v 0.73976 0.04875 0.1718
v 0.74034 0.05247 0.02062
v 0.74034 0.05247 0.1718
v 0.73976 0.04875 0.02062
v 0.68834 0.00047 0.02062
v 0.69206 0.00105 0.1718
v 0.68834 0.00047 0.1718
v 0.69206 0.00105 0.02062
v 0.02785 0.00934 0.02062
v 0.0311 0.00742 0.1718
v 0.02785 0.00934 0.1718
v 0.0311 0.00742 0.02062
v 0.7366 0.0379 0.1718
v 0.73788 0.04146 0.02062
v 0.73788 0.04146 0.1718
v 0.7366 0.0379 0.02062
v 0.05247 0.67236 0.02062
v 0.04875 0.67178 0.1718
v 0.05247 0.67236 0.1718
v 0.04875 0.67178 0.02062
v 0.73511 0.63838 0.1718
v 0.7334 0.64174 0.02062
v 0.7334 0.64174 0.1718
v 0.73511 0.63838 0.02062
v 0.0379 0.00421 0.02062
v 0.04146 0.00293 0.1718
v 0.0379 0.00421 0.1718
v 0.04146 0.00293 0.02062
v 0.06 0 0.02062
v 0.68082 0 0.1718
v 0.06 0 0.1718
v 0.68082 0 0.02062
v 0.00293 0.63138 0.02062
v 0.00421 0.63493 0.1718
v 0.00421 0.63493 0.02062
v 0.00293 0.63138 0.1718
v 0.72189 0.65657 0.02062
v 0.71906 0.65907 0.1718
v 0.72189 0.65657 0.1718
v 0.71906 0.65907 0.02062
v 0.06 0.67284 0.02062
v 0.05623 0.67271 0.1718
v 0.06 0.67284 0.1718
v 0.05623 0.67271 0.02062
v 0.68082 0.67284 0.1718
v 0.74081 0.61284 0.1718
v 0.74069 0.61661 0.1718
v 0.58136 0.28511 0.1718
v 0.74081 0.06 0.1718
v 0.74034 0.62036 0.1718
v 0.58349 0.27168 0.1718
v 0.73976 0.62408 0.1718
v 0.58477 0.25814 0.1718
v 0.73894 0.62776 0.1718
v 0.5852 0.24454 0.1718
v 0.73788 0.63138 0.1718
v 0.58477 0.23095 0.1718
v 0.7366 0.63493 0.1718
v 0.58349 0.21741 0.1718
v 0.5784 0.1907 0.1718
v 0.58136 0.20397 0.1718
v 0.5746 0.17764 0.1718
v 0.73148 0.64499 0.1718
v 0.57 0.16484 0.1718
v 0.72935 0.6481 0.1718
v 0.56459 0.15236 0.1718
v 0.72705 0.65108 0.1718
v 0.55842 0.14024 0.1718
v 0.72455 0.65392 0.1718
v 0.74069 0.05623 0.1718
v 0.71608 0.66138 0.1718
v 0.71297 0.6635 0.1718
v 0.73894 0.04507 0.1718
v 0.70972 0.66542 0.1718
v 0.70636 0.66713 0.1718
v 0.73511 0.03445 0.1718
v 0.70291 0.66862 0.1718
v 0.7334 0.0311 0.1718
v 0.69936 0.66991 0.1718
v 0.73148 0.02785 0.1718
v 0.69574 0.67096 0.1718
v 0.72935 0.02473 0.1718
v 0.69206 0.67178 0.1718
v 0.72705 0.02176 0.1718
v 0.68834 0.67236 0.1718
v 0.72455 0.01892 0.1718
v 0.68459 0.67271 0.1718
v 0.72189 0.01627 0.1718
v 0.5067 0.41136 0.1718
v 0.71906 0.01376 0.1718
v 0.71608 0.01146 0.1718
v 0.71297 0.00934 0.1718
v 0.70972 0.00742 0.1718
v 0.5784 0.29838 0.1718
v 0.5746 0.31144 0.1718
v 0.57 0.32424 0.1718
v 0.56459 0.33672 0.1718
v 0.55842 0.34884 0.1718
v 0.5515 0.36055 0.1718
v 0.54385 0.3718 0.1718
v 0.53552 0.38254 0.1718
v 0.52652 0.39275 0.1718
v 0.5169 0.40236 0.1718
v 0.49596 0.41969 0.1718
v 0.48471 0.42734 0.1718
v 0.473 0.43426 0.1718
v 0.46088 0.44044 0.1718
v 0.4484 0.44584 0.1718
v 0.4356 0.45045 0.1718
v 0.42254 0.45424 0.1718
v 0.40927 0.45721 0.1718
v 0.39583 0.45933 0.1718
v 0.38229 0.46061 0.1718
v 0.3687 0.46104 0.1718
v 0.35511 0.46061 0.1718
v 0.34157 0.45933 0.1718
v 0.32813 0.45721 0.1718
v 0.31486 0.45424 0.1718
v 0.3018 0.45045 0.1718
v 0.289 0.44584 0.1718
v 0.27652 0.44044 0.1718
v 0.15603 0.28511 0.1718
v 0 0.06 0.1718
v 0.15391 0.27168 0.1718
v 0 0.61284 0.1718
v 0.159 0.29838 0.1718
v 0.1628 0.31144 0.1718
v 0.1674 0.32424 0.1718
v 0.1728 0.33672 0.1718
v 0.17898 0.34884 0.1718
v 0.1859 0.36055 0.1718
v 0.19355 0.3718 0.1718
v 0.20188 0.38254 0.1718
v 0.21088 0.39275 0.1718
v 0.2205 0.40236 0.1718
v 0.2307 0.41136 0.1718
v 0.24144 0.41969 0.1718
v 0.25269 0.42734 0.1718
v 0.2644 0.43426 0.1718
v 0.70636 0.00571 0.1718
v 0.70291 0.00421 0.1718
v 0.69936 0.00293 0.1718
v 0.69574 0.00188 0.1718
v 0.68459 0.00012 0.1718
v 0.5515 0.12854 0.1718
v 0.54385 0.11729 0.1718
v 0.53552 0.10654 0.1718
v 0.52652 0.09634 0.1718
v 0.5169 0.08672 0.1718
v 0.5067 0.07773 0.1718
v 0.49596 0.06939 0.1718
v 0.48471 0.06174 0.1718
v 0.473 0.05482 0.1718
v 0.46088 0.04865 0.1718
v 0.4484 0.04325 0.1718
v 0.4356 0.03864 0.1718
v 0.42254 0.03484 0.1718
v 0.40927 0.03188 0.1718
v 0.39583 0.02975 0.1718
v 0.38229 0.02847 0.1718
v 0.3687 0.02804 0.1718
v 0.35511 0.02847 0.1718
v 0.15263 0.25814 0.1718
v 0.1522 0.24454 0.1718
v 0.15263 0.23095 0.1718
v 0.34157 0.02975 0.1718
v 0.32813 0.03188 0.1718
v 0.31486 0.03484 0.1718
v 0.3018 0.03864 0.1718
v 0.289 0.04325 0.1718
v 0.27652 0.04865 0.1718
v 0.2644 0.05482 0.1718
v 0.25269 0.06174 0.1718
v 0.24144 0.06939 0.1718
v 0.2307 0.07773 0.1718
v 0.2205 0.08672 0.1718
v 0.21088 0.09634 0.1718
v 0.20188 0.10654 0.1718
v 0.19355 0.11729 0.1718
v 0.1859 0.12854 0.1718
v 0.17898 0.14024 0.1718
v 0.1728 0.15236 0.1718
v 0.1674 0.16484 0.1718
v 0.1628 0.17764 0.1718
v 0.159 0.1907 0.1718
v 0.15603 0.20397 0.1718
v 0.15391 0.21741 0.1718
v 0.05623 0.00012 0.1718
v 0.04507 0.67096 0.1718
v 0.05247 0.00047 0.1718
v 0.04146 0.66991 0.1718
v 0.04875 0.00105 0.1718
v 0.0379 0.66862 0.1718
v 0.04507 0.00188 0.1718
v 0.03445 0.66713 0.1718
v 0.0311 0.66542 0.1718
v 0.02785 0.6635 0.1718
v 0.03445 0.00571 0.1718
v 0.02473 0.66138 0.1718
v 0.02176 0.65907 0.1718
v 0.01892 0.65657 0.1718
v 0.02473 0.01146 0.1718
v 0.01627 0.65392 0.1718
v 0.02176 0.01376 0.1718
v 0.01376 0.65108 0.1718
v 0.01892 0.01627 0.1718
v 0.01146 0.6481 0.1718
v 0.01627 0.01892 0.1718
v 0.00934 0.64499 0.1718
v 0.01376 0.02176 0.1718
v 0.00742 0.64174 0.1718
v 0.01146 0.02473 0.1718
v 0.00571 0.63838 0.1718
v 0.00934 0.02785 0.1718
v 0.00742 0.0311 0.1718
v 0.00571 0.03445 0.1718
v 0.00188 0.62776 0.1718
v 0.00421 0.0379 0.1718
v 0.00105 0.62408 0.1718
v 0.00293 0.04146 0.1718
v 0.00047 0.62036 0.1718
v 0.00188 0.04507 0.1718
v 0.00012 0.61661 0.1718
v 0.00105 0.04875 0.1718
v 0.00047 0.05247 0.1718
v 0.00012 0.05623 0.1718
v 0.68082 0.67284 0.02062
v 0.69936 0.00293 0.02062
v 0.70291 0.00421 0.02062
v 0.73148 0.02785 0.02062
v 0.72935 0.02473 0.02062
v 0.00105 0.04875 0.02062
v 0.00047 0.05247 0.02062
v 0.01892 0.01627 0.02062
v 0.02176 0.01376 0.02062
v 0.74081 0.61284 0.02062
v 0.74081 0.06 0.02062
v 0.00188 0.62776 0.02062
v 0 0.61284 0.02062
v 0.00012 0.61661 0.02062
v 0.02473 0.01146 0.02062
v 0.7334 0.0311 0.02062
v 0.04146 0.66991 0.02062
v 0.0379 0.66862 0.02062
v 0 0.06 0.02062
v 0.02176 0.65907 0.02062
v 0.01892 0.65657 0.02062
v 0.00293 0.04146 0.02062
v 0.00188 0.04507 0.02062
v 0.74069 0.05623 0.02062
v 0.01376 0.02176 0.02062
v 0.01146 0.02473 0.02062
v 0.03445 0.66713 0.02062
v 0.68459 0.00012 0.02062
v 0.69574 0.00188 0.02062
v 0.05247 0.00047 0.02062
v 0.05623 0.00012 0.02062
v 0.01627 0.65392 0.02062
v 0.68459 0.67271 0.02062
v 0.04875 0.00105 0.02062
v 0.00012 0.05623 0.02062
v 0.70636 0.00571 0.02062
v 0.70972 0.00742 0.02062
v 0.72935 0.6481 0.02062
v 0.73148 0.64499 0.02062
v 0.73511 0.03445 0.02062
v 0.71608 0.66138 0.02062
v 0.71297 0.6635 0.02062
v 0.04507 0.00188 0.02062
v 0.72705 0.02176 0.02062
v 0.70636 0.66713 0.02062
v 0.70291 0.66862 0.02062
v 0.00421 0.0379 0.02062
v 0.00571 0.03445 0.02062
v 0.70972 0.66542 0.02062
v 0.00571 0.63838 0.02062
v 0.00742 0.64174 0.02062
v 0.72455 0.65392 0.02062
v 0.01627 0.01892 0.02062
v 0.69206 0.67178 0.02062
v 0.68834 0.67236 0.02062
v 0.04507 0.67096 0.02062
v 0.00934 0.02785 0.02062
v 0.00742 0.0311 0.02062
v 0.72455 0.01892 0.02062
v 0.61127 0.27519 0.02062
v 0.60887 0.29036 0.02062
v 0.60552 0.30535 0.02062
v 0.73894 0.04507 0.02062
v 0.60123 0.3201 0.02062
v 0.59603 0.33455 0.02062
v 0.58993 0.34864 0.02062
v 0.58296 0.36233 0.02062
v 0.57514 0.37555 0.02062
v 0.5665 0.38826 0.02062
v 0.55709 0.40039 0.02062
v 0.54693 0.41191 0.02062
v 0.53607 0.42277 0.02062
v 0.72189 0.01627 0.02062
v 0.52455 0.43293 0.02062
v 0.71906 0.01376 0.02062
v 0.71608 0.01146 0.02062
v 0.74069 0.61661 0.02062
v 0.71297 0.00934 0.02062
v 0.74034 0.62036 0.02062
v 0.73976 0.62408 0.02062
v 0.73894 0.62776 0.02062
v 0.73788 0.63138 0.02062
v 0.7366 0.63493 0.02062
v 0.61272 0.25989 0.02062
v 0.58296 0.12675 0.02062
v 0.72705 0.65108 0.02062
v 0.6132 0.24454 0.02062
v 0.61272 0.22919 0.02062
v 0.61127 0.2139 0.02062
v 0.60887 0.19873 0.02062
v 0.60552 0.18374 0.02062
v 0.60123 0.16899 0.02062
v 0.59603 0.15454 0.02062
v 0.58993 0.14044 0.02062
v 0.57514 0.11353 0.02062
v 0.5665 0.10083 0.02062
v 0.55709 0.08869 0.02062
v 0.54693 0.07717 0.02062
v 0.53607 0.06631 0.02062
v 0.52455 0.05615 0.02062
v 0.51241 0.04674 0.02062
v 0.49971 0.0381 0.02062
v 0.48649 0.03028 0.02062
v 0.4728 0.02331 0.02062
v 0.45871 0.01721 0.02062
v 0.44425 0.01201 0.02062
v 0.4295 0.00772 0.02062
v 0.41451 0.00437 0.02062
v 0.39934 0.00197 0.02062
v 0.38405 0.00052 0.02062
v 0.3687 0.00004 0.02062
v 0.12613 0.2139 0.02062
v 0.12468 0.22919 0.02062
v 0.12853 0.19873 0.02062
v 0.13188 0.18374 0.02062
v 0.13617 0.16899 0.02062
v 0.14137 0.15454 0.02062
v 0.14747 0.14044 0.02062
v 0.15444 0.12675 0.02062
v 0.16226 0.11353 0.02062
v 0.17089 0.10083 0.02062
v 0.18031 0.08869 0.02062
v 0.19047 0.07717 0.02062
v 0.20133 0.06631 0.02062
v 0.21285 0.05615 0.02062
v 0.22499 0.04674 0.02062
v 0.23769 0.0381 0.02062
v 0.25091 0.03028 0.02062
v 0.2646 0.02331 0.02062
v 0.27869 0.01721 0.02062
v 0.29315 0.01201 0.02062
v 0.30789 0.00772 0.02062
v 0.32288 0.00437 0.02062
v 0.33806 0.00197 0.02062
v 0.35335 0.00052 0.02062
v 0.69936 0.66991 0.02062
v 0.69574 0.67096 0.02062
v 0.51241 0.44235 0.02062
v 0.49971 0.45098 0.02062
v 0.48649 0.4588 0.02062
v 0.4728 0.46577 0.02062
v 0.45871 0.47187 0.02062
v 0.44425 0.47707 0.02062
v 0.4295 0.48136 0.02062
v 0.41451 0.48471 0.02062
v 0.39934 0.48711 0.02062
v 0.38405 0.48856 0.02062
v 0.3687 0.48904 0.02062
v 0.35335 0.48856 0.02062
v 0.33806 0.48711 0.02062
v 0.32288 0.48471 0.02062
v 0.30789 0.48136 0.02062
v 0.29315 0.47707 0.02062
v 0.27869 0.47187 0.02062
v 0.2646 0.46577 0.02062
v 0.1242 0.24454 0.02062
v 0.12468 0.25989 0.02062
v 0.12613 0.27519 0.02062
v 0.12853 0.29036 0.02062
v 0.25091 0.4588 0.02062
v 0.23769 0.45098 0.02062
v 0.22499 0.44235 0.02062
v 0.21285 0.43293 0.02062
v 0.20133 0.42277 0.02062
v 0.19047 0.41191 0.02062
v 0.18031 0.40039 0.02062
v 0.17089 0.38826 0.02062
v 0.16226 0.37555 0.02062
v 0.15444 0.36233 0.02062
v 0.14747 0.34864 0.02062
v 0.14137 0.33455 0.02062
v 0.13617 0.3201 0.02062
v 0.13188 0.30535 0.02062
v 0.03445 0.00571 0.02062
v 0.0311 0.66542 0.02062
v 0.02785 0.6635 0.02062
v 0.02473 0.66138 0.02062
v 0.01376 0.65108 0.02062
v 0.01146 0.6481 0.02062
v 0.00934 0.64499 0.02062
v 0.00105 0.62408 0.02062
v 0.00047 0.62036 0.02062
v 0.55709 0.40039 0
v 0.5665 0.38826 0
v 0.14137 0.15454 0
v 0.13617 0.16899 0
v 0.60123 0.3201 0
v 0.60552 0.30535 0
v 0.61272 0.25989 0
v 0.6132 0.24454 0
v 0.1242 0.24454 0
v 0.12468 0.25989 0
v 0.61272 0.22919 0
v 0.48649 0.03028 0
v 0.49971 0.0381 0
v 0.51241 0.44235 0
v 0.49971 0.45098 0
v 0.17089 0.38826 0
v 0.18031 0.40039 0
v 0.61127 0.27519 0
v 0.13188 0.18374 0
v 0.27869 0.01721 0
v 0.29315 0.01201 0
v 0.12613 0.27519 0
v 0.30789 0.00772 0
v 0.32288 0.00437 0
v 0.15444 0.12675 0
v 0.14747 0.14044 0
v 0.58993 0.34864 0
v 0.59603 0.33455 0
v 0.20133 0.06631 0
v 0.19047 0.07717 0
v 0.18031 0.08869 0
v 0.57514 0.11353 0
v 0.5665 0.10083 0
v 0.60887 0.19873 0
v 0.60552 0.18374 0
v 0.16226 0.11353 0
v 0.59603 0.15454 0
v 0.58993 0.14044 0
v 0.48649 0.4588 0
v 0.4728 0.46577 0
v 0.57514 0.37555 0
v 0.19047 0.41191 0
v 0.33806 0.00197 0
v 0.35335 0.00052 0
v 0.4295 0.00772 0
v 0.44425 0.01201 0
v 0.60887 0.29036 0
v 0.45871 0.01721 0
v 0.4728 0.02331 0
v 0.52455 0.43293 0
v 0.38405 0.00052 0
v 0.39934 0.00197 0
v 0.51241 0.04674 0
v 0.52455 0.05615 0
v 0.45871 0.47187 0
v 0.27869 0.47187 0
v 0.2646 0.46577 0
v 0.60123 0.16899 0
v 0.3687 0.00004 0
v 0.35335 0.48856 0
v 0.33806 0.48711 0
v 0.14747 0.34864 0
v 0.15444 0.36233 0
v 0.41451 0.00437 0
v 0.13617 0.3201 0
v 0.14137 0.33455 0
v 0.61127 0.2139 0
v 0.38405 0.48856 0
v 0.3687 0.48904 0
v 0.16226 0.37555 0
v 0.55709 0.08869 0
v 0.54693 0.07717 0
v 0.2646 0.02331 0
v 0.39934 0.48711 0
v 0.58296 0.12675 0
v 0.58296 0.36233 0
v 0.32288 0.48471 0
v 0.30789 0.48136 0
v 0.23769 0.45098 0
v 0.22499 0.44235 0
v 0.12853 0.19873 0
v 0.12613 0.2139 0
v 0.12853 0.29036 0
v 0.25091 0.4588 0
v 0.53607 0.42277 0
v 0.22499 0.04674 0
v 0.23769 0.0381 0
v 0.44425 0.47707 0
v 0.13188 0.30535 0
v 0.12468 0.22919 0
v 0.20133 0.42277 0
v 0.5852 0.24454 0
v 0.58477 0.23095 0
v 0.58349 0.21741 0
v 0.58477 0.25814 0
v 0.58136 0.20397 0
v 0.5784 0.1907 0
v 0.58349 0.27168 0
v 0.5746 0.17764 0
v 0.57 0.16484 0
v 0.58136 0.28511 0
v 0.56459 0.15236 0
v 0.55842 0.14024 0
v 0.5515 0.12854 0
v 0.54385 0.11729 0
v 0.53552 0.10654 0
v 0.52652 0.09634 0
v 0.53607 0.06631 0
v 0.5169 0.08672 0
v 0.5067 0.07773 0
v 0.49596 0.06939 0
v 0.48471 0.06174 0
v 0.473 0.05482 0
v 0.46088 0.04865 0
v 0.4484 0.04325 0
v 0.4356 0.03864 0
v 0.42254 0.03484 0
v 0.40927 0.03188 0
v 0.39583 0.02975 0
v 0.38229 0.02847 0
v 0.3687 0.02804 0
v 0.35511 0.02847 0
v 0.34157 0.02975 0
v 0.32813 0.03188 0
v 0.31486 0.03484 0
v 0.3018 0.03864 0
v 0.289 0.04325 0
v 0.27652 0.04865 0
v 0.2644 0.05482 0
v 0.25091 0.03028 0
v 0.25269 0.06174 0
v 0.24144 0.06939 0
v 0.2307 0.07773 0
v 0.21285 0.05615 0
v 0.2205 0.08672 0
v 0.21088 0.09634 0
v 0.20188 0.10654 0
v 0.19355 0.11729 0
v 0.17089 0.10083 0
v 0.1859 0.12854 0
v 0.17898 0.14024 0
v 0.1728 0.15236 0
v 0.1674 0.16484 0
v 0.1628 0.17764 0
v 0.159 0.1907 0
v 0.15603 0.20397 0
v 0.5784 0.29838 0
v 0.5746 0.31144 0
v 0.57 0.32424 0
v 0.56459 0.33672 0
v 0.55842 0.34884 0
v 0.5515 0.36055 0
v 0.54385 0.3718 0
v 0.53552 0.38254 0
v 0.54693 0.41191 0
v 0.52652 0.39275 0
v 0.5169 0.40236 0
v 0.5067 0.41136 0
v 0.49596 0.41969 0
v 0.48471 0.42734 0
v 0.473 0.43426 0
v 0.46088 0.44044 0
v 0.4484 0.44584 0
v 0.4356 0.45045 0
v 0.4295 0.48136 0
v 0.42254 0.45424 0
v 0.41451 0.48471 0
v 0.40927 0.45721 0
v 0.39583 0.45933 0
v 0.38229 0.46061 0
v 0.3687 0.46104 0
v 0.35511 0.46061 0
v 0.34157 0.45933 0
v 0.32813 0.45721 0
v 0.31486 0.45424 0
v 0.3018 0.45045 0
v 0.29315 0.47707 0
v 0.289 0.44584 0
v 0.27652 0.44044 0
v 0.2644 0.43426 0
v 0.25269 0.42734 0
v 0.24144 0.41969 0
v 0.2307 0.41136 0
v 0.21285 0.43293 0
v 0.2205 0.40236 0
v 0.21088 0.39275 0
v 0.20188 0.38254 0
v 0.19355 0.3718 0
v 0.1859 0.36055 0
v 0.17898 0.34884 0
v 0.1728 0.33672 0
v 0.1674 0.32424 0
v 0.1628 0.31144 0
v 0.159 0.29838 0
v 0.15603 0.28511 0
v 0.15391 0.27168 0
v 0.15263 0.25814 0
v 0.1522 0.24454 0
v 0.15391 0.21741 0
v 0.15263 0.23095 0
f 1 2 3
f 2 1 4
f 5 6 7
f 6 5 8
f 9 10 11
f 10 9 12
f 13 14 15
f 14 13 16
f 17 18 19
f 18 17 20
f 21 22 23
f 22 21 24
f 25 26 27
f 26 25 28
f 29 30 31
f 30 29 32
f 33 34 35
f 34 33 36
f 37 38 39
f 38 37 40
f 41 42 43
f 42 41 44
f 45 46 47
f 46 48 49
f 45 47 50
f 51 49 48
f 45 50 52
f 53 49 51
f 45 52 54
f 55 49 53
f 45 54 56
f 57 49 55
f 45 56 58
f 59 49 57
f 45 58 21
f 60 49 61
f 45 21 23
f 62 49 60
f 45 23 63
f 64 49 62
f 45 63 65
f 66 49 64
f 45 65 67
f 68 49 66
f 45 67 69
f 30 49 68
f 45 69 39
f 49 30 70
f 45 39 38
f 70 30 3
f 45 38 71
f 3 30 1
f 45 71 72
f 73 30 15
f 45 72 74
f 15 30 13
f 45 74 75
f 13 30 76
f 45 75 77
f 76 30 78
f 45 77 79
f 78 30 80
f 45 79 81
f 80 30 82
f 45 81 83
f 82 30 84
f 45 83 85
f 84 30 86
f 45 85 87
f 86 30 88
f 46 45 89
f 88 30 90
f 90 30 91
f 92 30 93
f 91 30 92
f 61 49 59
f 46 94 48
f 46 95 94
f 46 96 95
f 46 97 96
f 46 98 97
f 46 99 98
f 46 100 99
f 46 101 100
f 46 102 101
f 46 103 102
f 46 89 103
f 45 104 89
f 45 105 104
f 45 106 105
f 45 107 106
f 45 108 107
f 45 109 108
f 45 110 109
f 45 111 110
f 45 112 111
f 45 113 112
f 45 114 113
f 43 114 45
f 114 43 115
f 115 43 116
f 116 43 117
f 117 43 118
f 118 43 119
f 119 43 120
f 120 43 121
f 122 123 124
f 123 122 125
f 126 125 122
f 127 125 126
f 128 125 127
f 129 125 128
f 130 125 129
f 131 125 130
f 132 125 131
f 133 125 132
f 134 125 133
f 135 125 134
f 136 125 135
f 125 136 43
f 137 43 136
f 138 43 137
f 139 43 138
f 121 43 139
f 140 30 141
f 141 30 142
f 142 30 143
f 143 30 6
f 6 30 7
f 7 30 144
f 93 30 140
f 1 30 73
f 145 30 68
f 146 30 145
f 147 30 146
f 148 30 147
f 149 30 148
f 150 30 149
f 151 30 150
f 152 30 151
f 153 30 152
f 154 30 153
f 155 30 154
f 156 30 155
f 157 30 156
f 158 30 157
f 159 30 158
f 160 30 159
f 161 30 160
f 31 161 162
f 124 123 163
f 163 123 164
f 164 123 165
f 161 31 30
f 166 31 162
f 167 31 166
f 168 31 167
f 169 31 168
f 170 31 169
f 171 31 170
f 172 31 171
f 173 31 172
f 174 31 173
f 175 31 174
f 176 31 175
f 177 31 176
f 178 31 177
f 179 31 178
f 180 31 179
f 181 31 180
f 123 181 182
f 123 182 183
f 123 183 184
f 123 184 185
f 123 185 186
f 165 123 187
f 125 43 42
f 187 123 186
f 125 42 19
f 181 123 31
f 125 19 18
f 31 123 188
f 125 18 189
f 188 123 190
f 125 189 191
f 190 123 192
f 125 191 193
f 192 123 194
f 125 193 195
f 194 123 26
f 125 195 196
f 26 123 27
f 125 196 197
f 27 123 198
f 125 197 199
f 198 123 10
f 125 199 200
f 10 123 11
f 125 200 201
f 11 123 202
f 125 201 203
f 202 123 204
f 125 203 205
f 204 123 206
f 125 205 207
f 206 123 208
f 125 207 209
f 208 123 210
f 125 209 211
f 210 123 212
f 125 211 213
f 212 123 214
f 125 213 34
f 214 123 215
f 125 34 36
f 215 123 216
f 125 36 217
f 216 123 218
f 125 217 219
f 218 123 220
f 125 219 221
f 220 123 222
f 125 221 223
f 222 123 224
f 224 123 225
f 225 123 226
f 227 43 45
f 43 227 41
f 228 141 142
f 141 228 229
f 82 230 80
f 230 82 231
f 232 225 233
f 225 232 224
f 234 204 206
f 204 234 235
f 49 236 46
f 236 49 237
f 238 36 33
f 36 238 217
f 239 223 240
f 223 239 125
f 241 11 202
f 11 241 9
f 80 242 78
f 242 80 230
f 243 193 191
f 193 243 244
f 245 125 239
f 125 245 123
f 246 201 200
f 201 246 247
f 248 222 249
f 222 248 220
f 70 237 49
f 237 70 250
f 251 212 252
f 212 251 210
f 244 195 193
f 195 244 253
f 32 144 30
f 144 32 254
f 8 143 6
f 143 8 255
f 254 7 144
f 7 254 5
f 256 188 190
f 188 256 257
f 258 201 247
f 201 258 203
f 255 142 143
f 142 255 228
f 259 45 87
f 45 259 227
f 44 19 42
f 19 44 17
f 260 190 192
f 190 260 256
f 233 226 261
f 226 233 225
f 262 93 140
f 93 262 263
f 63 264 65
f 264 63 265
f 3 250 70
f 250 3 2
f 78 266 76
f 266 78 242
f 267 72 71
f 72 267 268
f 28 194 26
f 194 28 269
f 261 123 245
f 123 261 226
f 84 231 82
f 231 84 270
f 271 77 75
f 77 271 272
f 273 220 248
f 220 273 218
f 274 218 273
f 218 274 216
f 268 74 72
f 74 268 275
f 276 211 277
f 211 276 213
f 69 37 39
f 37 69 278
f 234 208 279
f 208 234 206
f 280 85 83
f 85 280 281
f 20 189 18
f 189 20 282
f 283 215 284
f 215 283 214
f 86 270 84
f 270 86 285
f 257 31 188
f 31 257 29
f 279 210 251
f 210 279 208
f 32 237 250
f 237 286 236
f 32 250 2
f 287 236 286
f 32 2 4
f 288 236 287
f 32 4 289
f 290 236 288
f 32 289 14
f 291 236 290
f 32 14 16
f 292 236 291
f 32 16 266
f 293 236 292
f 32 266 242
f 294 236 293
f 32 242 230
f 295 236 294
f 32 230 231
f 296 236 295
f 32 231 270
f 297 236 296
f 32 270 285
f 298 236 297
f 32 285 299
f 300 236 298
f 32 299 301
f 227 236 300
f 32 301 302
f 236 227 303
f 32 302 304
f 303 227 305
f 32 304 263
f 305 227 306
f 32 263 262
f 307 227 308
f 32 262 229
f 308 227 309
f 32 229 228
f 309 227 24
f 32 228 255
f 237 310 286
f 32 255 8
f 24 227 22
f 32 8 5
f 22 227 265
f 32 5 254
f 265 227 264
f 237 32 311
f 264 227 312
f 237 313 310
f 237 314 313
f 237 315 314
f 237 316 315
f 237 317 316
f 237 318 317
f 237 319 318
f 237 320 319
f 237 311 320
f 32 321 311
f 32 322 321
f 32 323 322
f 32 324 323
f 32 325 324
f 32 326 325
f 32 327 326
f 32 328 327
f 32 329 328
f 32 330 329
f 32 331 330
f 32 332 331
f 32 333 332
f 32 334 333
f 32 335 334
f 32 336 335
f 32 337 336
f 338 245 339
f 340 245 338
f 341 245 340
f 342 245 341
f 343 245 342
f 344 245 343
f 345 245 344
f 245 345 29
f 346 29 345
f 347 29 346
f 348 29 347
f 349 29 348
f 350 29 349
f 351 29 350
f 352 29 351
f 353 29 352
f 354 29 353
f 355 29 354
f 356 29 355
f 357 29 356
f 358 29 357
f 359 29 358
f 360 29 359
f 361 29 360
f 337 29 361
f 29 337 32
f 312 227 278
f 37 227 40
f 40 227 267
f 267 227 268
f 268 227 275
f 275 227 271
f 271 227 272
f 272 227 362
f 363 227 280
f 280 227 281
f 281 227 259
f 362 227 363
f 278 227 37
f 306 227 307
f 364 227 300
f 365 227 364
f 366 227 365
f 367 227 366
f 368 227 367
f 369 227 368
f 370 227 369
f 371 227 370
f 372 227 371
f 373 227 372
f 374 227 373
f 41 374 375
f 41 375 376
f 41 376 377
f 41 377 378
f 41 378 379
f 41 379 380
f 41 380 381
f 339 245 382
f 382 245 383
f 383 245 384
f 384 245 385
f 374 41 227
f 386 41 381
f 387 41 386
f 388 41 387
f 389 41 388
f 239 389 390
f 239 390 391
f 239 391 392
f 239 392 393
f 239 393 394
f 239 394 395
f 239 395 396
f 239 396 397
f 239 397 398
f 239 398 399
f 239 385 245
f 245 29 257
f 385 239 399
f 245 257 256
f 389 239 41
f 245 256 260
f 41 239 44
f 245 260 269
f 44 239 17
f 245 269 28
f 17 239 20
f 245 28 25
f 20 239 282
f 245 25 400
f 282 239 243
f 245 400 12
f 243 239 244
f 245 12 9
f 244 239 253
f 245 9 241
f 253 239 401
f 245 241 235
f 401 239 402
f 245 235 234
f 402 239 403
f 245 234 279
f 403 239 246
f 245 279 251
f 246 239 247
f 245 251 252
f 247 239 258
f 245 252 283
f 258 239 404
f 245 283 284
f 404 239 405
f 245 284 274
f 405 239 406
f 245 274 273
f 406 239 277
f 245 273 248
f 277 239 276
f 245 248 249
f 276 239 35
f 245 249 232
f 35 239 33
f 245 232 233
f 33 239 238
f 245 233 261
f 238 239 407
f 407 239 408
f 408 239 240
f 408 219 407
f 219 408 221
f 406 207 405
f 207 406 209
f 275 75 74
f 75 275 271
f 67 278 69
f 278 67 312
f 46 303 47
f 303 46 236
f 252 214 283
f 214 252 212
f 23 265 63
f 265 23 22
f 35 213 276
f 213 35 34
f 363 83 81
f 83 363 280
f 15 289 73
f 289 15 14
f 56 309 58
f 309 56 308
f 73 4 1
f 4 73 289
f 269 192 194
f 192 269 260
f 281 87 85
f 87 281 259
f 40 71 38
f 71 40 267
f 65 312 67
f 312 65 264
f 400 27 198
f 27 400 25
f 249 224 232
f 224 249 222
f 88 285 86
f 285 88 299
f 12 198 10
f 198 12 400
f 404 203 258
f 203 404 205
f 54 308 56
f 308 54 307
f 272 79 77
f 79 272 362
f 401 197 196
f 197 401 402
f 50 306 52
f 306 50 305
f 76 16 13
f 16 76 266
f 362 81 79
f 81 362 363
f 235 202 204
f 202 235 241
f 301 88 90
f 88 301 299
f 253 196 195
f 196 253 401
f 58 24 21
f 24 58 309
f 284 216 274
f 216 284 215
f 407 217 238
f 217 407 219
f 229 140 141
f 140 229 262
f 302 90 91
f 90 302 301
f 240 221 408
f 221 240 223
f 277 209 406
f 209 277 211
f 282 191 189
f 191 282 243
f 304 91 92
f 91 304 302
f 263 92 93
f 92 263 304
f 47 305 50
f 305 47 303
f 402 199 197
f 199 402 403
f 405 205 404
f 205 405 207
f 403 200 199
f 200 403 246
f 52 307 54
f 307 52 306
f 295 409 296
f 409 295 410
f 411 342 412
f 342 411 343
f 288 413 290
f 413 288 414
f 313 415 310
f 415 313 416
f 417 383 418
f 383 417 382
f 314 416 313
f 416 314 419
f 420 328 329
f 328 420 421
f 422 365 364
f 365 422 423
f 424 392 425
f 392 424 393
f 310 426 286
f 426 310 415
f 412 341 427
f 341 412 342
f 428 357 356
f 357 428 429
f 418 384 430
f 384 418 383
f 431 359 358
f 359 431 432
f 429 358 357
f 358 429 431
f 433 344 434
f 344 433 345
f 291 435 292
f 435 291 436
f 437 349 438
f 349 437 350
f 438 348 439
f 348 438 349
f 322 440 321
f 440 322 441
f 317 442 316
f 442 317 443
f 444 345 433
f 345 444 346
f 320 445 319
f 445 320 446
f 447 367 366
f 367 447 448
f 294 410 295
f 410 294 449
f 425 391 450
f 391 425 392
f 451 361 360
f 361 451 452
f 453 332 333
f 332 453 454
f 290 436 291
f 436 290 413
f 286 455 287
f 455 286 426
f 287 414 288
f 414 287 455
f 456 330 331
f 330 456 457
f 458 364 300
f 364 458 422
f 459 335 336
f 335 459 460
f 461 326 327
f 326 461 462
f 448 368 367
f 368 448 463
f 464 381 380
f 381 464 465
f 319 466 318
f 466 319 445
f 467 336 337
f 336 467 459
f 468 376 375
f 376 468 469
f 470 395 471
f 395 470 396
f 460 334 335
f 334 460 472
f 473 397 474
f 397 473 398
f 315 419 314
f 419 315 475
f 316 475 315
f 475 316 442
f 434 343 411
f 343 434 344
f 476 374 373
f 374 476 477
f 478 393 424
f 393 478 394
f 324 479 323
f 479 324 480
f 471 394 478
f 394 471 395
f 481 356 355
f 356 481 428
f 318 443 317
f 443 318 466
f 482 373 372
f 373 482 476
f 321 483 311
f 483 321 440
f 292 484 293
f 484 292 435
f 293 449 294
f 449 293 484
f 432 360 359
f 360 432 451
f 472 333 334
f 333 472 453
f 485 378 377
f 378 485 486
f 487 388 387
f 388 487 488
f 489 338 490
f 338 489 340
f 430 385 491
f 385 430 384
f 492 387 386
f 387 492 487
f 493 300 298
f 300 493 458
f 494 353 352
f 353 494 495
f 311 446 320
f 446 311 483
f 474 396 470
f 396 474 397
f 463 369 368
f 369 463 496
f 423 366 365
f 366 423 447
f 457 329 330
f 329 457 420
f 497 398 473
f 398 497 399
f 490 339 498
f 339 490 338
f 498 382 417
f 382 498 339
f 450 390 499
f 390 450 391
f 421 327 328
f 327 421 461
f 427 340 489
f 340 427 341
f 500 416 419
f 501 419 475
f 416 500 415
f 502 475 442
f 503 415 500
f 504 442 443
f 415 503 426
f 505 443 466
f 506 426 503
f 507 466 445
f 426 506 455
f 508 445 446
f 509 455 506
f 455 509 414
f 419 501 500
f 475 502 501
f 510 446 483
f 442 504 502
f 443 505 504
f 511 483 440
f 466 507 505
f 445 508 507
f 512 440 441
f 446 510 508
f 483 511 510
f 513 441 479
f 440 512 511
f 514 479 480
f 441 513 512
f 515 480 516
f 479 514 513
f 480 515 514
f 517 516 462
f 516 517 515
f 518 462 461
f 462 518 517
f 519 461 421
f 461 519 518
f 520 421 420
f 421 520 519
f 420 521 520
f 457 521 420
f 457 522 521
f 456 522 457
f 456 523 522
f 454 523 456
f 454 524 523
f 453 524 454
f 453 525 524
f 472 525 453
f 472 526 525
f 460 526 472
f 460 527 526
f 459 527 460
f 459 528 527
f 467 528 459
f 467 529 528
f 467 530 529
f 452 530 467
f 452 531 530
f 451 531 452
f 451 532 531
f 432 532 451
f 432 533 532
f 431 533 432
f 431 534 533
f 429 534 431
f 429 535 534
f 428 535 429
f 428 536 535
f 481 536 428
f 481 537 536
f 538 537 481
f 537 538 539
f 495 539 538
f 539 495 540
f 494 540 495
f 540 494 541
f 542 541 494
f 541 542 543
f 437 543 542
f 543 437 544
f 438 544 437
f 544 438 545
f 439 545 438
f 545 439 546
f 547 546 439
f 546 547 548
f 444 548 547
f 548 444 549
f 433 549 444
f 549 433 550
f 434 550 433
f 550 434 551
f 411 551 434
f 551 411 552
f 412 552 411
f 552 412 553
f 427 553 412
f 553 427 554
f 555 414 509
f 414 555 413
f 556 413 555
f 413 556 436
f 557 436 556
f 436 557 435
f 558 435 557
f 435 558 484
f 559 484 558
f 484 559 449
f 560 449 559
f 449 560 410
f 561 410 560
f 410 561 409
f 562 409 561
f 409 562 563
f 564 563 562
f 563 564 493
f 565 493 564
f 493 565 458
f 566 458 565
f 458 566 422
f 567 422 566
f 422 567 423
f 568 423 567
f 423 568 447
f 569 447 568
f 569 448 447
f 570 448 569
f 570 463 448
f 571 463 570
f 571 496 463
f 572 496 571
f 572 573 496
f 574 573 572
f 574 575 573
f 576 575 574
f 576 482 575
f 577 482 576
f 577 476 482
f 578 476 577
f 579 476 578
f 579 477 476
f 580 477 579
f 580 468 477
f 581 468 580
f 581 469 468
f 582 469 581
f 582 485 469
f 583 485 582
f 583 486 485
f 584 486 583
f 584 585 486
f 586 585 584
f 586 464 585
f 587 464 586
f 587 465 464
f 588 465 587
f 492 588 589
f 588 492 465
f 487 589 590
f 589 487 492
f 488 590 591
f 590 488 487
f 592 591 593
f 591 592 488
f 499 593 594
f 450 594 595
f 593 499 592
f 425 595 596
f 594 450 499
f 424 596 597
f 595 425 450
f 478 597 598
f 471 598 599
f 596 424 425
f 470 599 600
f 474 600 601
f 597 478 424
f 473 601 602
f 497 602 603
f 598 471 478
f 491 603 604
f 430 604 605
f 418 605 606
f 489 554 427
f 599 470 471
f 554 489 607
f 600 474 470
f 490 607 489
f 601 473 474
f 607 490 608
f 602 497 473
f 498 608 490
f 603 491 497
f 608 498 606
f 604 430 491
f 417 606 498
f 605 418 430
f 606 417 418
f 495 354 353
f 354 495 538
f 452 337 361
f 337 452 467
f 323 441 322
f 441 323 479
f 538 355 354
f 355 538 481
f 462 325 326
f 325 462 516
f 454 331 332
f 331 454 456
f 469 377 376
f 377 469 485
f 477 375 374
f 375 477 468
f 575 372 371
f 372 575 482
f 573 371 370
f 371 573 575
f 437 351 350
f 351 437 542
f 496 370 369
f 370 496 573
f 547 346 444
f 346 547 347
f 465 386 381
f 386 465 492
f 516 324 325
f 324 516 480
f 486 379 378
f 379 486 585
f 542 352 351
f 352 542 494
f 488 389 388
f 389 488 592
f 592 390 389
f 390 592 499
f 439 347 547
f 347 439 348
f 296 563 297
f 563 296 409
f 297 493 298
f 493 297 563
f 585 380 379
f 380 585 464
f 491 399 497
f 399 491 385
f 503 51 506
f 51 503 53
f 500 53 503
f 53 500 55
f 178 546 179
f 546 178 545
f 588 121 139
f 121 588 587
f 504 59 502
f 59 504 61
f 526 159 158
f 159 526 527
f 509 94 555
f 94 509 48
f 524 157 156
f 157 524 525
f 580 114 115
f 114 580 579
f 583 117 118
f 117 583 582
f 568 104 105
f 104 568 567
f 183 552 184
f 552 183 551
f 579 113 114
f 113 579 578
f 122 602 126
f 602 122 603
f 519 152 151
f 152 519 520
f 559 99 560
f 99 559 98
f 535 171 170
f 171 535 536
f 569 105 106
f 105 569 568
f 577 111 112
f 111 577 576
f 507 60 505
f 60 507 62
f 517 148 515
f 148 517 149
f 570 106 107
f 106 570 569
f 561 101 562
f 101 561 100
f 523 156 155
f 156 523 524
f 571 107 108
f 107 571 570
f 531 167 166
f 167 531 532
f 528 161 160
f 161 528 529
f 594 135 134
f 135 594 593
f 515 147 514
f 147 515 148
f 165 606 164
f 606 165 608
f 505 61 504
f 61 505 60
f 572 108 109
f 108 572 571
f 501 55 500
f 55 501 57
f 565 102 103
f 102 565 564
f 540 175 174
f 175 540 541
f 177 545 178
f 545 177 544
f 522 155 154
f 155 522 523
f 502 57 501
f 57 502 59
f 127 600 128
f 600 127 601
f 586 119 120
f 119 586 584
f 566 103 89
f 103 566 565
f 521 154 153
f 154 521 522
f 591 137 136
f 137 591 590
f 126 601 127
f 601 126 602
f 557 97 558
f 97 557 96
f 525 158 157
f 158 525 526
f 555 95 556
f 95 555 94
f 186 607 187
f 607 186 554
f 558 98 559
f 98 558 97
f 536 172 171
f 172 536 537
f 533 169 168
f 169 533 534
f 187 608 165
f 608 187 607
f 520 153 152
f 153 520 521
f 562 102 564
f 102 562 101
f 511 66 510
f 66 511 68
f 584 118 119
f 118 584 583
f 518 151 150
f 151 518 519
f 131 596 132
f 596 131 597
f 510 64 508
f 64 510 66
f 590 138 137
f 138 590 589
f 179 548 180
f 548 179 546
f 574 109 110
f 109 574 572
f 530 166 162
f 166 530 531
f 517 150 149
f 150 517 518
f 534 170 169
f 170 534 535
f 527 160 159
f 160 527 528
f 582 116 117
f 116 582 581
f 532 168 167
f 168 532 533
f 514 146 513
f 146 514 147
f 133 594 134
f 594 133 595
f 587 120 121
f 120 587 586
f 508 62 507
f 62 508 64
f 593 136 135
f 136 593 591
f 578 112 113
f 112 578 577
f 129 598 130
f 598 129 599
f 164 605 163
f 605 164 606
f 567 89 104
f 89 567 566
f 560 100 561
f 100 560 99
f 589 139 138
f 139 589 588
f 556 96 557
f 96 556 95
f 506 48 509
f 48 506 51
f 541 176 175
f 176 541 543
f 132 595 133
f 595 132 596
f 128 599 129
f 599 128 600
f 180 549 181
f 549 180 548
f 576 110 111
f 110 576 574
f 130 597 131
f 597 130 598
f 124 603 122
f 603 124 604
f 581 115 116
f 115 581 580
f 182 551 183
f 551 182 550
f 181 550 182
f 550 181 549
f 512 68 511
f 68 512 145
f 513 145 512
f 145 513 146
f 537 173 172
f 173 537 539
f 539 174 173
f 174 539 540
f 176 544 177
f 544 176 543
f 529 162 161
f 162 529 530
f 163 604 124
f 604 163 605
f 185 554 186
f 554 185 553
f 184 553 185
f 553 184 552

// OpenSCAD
// === Rounded Wedge Bearing Housing ===

// Overall bounding dimensions
length    = 0.740822;       // X total extent
width     = 0.672842;       // Y total extent
height    = 0.171797;       // Z total extent
corner_r  = 0.060;          // Base perimeter rounding radius

// Stepped underside parameters
ring_h    = 0.020616;       // Shallow ring/step depth on bottom
base_h    = height - ring_h;// Outer base thickness (0.1512)

// Central circular through-opening
hole_cx   = 0.3687;                 // Center X from left edge
hole_cy   = width - 0.4283;         // Center Y from back edge (~0.2445)
hole_r    = 0.2165;                  // Opening radius

// Ring lip around central opening (forms underside step)
ring_lip_w = 0.028;                  // Lip width beyond hole radius

// Narrow structural web crossing the central opening
web_x     = 0.3434;                  // X start (left offset)
web_w     = 0.025368;               // X width
web_y     = 0.028;                   // Y start (back offset)
web_d     = 0.432873;               // Y depth (spans hole diameter)

// Boss (hub) inside central opening
boss_cx     = 0.4796;               // Center X from left edge
boss_cy     = width - 0.4282;       // Center Y from back edge (~0.2446)
boss_r      = 0.0992;               // Outer body radius (0.1984/2)
boss_hole_r = 0.075358;             // Inner bore radius (0.150716/2)

$fn = 100;

// --- Helper Modules ---

// 2D rounded rectangular base outline
module base_2d() {
    offset(r = corner_r)
        offset(delta = -corner_r)
            square([length, width]);
}

// 2D boss profile with bridge connecting to outer base body
module boss_2d() {
    hull() {
        // Main boss cylinder footprint
        translate([boss_cx, boss_cy])
            circle(r = boss_r);
        // Bridge connection point at right side of hole boundary
        translate([hole_cx + hole_r + 0.002, boss_cy])
            circle(r = 0.006);
    }
}

// --- Main Assembly ---

difference() {
    union() {
        // 1) Outer base body — raised by ring_h to create underside step
        translate([0, 0, ring_h])
            linear_extrude(base_h)
                base_2d();

        // 2) Ring pad — full-height circular region around hole
        //    Creates the stepped underside: extends from z=0 while
        //    outer base starts at z=ring_h
        linear_extrude(height)
            translate([hole_cx, hole_cy])
                circle(r = hole_r + ring_lip_w);

        // 3) Structural web crossing central opening (full height)
        translate([web_x, web_y, 0])
            cube([web_w, web_d, height]);

        // 4) Boss hub inside central opening (full height)
        linear_extrude(height)
            boss_2d();
    }

    // 5) Central circular through-opening
    //    Removes material from base and ring pad, leaving slot-like
    //    openings on either side of the web and boss
    translate([hole_cx, hole_cy, -0.01])
        cylinder(h = height + 0.02, r = hole_r);

    // 6) Boss bore — through-hole in the hub
    translate([boss_cx, boss_cy, -0.01])
        cylinder(h = height + 0.02, r = boss_hole_r);
}
